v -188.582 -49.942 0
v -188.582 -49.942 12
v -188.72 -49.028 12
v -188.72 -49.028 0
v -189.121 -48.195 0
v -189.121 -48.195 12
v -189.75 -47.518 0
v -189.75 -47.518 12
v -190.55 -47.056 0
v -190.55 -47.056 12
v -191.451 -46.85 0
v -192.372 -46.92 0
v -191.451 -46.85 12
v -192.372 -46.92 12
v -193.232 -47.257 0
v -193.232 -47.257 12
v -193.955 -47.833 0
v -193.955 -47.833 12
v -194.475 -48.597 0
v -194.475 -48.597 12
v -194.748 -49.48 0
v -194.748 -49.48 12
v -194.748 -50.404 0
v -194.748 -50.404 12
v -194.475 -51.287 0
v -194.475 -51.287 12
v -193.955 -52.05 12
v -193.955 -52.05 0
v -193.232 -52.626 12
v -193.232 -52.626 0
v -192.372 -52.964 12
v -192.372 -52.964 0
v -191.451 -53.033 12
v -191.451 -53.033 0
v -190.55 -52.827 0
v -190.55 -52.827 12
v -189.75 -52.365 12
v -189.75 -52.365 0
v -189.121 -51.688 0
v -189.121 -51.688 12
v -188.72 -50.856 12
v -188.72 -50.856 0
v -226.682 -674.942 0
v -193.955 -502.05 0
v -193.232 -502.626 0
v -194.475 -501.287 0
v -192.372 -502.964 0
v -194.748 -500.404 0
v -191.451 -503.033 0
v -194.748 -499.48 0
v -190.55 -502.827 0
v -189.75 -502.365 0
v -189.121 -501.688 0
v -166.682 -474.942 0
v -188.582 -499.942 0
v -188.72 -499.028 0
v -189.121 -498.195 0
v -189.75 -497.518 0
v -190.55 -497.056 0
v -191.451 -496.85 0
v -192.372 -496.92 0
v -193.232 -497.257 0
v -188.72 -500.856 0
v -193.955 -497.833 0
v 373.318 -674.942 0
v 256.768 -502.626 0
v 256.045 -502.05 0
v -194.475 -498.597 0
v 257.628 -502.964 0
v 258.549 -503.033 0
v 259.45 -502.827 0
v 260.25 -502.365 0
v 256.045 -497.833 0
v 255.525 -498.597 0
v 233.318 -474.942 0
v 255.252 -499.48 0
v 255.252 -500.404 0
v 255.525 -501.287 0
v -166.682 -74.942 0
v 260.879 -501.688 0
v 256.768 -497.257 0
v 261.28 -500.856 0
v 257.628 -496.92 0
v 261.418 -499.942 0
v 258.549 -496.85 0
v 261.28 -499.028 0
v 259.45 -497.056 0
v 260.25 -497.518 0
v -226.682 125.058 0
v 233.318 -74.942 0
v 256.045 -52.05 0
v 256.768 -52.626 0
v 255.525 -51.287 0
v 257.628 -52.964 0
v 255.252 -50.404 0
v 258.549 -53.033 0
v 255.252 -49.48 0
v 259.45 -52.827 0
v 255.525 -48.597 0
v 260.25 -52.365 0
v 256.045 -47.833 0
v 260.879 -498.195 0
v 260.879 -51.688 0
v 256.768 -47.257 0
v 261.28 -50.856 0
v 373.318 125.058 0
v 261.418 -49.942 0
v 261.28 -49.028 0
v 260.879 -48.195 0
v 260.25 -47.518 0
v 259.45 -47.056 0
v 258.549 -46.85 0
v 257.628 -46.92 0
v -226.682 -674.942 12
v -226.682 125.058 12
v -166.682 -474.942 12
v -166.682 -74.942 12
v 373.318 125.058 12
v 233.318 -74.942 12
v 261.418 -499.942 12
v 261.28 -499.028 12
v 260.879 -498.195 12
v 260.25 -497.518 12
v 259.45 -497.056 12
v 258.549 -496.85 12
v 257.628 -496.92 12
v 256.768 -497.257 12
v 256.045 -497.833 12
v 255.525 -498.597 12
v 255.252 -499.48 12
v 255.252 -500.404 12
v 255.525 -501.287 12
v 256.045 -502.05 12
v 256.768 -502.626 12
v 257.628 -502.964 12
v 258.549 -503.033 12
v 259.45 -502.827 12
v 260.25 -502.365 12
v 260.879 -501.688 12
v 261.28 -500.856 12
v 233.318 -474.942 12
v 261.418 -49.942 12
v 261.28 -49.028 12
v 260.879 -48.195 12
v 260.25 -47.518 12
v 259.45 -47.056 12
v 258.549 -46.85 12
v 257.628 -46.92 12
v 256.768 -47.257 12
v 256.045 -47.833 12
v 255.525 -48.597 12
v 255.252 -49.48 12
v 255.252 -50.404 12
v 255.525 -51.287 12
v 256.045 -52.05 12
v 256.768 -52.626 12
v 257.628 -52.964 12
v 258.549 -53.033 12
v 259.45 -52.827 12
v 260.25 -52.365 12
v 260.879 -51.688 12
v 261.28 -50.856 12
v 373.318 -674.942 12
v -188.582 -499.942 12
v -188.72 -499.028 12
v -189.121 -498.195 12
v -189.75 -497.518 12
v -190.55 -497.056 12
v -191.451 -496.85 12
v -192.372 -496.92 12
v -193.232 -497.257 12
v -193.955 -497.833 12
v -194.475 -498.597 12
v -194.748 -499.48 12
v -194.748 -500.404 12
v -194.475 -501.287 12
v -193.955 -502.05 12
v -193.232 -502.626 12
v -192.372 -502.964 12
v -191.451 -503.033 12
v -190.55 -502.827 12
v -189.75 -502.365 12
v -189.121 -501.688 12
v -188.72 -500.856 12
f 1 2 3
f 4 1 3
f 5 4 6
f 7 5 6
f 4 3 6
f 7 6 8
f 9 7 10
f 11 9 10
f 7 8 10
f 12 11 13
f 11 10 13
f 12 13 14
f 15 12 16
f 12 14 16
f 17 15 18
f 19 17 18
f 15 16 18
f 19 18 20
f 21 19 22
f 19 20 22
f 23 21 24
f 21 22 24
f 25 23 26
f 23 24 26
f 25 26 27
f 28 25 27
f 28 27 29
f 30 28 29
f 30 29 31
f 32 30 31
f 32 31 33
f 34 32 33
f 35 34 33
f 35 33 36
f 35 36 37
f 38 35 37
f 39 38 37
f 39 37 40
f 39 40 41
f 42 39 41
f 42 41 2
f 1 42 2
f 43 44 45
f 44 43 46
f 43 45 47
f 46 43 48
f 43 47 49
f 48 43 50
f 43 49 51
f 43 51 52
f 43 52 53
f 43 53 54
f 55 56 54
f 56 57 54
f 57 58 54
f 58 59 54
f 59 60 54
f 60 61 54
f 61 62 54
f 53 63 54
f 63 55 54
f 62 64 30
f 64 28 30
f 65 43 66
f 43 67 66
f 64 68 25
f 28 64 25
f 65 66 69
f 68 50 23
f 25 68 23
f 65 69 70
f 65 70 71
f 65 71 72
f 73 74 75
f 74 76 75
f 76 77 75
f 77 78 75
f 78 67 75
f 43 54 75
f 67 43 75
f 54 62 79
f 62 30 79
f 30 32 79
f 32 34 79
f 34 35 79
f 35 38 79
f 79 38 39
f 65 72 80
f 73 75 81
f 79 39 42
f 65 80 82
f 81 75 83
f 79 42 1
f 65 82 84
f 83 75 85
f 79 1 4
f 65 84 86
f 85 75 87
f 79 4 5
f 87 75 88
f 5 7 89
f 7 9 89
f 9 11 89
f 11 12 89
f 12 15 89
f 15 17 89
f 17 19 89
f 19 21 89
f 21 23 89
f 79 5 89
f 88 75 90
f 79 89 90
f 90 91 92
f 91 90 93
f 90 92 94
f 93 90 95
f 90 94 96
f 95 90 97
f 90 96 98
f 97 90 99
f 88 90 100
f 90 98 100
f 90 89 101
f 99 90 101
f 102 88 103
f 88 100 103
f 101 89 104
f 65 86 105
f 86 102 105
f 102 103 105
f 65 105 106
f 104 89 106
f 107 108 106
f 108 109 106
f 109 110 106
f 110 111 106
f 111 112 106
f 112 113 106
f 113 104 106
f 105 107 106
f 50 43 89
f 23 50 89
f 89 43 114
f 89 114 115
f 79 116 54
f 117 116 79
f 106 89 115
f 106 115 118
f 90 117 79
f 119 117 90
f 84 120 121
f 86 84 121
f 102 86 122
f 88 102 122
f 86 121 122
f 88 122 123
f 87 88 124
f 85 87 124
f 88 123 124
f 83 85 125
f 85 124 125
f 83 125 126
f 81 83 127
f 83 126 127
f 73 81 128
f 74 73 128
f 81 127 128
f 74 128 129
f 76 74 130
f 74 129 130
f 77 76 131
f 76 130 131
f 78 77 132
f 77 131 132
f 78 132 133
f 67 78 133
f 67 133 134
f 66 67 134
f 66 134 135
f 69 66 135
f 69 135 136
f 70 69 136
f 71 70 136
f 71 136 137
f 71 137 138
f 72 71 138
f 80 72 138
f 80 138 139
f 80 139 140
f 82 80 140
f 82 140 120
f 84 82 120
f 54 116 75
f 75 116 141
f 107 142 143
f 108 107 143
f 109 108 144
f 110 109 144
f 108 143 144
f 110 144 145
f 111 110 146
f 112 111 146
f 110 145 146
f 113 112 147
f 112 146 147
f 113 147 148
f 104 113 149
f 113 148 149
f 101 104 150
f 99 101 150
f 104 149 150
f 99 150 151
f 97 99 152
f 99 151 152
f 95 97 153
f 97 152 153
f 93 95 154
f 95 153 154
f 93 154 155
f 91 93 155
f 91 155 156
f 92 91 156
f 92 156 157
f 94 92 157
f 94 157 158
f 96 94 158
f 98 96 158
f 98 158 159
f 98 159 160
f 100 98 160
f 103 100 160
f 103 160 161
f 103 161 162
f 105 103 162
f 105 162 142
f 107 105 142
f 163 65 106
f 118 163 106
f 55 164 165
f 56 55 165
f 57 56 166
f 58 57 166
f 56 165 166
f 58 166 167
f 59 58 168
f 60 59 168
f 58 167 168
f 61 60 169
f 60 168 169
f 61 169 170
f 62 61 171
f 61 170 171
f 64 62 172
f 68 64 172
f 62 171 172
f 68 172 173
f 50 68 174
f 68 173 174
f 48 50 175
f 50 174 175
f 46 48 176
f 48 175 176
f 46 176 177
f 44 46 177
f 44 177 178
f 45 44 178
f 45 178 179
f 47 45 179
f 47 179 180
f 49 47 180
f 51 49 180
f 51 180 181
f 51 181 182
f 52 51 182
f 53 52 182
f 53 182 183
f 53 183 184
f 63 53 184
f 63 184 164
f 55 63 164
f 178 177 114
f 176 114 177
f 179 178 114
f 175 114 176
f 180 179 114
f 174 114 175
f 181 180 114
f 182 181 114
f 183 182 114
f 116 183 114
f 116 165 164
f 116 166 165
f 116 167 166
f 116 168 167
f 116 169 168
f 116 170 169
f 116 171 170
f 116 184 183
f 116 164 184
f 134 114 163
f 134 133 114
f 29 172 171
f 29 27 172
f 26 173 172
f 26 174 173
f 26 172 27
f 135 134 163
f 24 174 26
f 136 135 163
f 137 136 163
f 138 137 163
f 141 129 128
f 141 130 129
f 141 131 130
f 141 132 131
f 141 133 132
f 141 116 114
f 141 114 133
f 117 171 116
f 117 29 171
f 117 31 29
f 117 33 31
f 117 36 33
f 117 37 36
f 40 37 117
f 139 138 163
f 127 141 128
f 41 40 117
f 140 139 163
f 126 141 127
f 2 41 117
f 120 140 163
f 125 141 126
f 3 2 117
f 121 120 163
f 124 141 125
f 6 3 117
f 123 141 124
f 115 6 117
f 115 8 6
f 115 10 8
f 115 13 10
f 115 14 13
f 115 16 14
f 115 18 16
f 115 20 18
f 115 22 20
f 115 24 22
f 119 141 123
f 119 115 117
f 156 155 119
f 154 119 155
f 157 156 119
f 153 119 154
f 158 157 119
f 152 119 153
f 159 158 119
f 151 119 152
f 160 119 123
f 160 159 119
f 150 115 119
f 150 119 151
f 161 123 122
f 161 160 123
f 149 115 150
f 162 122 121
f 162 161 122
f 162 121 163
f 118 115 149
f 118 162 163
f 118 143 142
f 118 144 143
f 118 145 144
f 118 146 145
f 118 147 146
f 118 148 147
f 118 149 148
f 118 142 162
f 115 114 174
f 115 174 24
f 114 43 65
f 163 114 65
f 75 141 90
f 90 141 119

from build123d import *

# Parameters (mm, degrees)
F0_W     = 600
F0_H     = 800
F1_DEPTH = 12
F2_W     = 400
F2_H     = 400
F3_DEPTH = 15
F5_R     = 3.1
F6_DEPTH = 50


with BuildPart() as f1:
    # F0 (on Top) → F1 (new body)
    with BuildSketch(Plane.XY):
        with Locations((73.317543, -274.941781)):
            Rectangle(F0_W, F0_H)
    extrude(amount=F1_DEPTH)

    # F2 (on face) → F3 (cut)
    with BuildSketch(Plane.XY.offset(12)):
        with Locations((33.317543, -274.941781)):
            Rectangle(F2_W, F2_H)
    extrude(amount=-F3_DEPTH, mode=Mode.SUBTRACT)

    # F5 (on face) → F6 (cut)
    with BuildSketch(Plane.XY.offset(12)):
        with Locations((-191.682457, -49.941781)):
            Circle(F5_R)
        with Locations((-191.682457, -499.941781)):
            Circle(F5_R)
        with Locations((258.317543, -49.941781)):
            Circle(F5_R)
        with Locations((258.317543, -499.941781)):
            Circle(F5_R)
    extrude(amount=-F6_DEPTH, mode=Mode.SUBTRACT)


solid = f1.part
